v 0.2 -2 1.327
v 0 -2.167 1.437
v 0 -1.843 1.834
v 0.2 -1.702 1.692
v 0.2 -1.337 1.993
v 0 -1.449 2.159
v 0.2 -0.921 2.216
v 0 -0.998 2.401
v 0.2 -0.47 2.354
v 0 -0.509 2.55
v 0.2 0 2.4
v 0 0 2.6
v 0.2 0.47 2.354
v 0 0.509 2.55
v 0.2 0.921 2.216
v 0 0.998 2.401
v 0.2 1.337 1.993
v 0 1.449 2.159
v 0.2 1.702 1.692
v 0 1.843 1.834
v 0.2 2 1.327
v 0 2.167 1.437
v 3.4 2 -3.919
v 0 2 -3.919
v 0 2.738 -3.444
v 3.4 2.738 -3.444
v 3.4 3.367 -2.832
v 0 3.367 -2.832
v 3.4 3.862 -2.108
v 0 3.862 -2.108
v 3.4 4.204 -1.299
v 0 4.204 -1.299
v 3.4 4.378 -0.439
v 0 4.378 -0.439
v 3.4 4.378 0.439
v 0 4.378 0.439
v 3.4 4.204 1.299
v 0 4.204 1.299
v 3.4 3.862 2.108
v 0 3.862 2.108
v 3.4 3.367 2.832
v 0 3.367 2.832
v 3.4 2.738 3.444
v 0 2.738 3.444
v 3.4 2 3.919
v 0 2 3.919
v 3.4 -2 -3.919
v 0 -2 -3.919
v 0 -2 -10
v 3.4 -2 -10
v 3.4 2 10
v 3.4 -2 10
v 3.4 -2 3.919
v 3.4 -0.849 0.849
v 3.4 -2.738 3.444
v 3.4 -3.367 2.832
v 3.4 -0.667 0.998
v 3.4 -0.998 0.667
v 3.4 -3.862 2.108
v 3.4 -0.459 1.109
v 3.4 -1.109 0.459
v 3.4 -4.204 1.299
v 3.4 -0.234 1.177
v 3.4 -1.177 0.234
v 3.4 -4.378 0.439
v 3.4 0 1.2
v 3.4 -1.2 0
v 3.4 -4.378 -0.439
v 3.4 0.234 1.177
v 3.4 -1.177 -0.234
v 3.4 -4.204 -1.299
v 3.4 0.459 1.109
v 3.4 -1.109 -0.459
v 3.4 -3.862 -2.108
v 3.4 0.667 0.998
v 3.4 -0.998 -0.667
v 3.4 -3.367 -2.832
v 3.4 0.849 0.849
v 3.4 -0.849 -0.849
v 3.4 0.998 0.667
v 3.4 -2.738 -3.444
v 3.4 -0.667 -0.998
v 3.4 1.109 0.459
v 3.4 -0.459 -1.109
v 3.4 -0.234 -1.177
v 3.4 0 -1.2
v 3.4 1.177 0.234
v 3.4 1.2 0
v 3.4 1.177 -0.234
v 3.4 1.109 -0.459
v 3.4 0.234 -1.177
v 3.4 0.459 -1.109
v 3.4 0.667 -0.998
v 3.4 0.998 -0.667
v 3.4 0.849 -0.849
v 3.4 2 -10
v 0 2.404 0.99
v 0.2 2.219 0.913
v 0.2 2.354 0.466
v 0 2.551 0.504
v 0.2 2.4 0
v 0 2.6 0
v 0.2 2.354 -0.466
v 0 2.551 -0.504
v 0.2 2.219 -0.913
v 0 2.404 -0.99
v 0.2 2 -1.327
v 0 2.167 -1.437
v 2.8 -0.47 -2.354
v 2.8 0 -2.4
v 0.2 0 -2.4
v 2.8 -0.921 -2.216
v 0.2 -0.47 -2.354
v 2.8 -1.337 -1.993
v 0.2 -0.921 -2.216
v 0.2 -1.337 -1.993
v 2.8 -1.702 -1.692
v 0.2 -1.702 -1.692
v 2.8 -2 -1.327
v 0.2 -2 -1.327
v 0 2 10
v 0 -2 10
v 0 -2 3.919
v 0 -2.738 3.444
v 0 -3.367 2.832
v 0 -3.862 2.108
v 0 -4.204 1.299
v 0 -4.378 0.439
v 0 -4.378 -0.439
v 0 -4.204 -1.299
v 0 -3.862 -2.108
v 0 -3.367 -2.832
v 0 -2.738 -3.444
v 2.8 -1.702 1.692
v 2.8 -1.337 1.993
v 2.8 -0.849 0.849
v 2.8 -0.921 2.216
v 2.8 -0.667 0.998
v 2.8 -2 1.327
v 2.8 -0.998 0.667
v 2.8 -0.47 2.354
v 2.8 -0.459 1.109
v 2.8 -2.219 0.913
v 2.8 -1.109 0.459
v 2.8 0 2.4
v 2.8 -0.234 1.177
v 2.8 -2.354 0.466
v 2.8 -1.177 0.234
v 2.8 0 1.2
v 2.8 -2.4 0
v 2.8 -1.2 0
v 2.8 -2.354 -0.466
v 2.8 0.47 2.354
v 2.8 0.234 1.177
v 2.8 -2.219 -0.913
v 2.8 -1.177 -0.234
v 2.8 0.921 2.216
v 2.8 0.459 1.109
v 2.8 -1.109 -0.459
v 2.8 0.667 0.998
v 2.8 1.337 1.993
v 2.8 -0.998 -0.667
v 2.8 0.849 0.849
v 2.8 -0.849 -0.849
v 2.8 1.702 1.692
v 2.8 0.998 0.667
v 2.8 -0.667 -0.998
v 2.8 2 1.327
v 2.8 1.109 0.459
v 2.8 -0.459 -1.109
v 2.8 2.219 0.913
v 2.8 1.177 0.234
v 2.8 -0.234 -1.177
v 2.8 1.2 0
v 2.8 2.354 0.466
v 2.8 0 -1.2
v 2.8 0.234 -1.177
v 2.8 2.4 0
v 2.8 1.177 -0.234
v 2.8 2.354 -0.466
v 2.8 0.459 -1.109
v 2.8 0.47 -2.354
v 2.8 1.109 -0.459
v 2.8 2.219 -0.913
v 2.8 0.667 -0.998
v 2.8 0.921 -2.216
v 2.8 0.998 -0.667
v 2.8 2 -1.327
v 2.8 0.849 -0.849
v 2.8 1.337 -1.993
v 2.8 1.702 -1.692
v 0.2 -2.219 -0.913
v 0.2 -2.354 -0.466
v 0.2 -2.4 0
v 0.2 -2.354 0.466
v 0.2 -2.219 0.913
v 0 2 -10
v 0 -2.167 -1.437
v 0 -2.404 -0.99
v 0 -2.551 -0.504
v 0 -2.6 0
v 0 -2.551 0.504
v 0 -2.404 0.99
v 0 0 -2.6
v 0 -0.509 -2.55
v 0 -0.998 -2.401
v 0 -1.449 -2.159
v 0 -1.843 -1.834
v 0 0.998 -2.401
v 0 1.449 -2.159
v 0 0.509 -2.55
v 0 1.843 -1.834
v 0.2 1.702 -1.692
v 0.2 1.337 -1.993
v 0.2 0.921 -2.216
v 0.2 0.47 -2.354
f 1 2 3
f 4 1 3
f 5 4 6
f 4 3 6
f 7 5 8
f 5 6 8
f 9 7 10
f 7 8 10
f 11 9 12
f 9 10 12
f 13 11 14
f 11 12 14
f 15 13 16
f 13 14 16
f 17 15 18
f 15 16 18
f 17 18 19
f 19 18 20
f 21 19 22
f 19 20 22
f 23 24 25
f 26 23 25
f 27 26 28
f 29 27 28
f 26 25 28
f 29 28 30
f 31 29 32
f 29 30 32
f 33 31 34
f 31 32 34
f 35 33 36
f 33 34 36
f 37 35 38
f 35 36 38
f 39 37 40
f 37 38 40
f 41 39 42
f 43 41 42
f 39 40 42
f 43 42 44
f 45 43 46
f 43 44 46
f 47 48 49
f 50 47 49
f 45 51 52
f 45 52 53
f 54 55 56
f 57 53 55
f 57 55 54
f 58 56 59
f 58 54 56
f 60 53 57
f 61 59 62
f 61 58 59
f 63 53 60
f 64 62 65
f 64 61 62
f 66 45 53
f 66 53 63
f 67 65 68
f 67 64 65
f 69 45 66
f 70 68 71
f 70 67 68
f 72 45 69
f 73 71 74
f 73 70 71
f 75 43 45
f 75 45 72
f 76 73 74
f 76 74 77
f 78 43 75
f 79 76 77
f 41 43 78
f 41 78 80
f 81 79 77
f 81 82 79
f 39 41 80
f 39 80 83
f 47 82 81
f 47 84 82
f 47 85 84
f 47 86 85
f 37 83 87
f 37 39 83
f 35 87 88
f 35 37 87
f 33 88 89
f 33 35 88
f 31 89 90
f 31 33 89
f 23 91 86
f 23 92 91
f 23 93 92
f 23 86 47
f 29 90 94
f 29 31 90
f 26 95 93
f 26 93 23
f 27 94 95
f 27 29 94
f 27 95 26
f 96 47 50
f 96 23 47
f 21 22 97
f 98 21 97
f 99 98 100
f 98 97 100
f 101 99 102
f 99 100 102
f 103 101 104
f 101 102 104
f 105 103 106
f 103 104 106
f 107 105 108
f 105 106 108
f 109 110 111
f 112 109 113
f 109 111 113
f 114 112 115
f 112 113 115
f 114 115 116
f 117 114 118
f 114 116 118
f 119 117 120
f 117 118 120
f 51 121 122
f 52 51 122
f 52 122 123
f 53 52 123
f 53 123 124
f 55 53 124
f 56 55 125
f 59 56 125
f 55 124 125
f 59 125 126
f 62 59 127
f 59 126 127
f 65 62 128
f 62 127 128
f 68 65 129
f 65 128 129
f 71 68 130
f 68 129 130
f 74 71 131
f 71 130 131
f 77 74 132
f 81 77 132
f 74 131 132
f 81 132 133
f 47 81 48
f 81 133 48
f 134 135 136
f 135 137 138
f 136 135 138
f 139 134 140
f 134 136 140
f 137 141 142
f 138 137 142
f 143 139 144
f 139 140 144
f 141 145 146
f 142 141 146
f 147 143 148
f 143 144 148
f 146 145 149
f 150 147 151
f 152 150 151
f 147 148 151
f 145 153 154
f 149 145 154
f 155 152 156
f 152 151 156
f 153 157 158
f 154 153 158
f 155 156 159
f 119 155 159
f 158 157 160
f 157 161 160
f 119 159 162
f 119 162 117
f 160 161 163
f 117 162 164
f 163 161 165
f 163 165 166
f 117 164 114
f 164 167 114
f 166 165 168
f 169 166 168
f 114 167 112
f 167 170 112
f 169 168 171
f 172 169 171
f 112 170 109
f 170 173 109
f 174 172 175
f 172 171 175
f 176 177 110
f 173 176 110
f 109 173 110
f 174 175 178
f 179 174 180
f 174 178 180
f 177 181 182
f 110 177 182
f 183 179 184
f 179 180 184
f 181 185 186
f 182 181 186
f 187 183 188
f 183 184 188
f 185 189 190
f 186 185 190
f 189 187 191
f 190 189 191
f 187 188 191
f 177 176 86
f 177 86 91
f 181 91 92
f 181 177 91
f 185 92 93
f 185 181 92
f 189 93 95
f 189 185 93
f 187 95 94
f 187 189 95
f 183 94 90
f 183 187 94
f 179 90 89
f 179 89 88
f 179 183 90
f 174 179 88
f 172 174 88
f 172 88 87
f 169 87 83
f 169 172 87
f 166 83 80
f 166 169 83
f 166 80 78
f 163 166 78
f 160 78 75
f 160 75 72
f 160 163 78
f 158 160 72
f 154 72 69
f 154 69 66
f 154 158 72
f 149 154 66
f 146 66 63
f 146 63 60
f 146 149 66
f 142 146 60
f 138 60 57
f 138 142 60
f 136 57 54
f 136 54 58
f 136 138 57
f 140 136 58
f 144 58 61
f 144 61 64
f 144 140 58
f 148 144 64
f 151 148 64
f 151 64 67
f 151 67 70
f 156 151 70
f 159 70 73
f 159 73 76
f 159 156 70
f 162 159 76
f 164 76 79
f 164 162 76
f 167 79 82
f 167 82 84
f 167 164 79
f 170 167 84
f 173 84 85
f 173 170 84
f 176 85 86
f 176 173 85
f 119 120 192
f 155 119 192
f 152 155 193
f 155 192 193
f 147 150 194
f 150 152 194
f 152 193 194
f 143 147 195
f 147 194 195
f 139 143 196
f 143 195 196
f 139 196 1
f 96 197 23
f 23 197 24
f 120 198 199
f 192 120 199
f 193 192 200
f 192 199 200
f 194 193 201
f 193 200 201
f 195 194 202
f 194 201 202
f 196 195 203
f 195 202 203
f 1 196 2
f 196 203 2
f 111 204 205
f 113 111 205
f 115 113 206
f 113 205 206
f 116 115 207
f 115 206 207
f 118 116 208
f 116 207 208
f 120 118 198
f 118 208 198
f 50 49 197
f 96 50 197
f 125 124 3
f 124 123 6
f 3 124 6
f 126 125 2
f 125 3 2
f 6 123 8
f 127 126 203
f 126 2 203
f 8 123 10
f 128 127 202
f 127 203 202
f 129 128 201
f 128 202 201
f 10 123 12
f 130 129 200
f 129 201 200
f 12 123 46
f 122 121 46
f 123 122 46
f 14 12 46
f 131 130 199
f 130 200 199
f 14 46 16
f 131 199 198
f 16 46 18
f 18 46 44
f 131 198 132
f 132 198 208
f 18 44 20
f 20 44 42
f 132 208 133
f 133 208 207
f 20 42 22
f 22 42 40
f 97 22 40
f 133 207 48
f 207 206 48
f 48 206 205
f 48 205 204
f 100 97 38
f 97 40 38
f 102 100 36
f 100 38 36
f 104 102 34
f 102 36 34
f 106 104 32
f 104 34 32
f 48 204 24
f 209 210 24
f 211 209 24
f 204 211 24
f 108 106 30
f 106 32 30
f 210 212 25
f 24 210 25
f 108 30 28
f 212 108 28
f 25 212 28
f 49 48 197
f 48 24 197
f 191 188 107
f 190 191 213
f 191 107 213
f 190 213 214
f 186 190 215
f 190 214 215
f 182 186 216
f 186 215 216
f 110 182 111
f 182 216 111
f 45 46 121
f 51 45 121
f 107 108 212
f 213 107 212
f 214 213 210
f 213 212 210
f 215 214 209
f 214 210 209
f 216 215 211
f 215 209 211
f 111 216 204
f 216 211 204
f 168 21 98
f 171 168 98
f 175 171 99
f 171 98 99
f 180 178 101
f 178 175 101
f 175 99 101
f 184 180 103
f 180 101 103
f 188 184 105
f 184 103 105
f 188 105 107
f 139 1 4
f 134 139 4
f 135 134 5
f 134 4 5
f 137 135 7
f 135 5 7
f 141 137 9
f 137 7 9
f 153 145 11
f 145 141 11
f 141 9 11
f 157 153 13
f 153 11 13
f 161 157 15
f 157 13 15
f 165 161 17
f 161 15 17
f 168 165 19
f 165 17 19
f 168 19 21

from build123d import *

# Parameters (mm, degrees)
EXTRUDE_1_DEPTH = 3.4
EXTRUDE_START   = -0.6
SKETCH_2_R      = 2.4
SKETCH_2_R_2    = 1.2
EXTRUDE_2_DEPTH = 0.6
CHAMFER_1_SIZE  = 0.2


with BuildPart() as part:
    # 草图1 → 凸台-拉伸1 (new body)
    with BuildSketch(Plane(origin=(0, 0, 0), x_dir=(0, 0, -1), z_dir=(1, 0, 0))):
        with BuildLine():
            Line((1.326649916, 2), (3.919183588, 2))
            ThreePointArc((3.919183588, 2), (0, 4.4), (-3.919183588, 2))
            Line((-3.919183588, 2), (-1.326649916, 2))
            ThreePointArc((-1.326649916, 2), (0, 2.4), (1.326649916, 2))
        make_face()
        with BuildLine():
            ThreePointArc((4.4, 0), (4.278107513, 1.028492151), (3.919183588, 2))
            Line((3.919183588, 2), (1.326649916, 2))
            ThreePointArc((1.326649916, 2), (2.114705629, 1.134909732), (2.4, 0))
            ThreePointArc((2.4, 0), (2.114705629, -1.134909732), (1.326649916, -2))
            Line((1.326649916, -2), (3.919183588, -2))
            ThreePointArc((3.919183588, -2), (4.278107513, -1.028492151), (4.4, 0))
        make_face()
        with BuildLine():
            Line((-1.326649916, 2), (-3.919183588, 2))
            ThreePointArc((-3.919183588, 2), (-4.4, 0), (-3.919183588, -2))
            Line((-3.919183588, -2), (-1.326649916, -2))
            ThreePointArc((-1.326649916, -2), (-2.4, 0), (-1.326649916, 2))
        make_face()
        with BuildLine():
            ThreePointArc((-3.919183588, -2), (-4.4, 0), (-3.919183588, 2))
            Line((-3.919183588, 2), (-10, 2))
            Line((-10, 2), (-10, -2))
            Line((-10, -2), (-3.919183588, -2))
        make_face()
        with BuildLine():
            Line((10, -2), (10, 2))
            Line((10, 2), (3.919183588, 2))
            ThreePointArc((3.919183588, 2), (4.278107513, 1.028492151), (4.4, 0))
            ThreePointArc((4.4, 0), (4.278107513, -1.028492151), (3.919183588, -2))
            Line((3.919183588, -2), (10, -2))
        make_face()
        with BuildLine():
            ThreePointArc((-3.919183588, -2), (0, -4.4), (3.919183588, -2))
            Line((3.919183588, -2), (1.326649916, -2))
            ThreePointArc((1.326649916, -2), (0, -2.4), (-1.326649916, -2))
            Line((-1.326649916, -2), (-3.919183588, -2))
        make_face()
    extrude(amount=EXTRUDE_1_DEPTH)

    # 草图2 → 凸台-拉伸2 (add)
    with BuildSketch(Plane(origin=(3.4, 0, 0), x_dir=(0, 0, -1), z_dir=(1, 0, 0)).offset(EXTRUDE_START)):
        Circle(SKETCH_2_R)
        Circle(SKETCH_2_R_2, mode=Mode.SUBTRACT)
    extrude(amount=EXTRUDE_2_DEPTH)

    # 倒角1
    chamfer_1_edges = [part.edges().sort_by_distance(p)[0] for p in [
        (0, 2, 1.326649916),
    ]]
    chamfer(chamfer_1_edges, length=CHAMFER_1_SIZE)


solid = part.part
